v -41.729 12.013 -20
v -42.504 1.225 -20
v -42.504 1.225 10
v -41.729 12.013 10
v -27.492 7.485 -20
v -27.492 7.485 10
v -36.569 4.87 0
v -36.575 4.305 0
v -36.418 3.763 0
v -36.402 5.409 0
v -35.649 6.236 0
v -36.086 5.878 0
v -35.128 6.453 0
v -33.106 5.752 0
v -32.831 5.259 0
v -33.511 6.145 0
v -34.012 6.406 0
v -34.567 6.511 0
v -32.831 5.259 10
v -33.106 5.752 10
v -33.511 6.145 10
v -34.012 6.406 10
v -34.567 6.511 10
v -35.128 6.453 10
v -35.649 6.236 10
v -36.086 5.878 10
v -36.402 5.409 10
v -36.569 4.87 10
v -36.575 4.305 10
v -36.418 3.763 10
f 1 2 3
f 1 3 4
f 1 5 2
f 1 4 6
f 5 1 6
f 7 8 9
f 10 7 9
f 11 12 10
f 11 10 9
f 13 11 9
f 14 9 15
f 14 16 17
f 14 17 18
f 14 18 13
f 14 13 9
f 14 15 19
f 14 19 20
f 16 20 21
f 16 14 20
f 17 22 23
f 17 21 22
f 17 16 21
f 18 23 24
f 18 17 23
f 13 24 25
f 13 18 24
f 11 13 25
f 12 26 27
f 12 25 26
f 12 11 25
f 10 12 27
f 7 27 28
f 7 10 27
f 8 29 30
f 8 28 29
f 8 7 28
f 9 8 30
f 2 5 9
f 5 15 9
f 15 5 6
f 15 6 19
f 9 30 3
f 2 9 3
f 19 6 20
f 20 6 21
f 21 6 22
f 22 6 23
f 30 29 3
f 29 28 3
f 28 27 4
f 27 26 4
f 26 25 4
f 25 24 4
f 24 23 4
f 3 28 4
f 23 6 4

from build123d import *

# Parameters (mm, degrees)
CIRCLE_R              = 1.944096
EXTRUDE010_DEPTH      = 100
EXTRUDE008_DEPTH      = 10
EXTRUDE008_DEPTH_BACK = 20


with BuildPart() as extrude010:
    # Circle → Extrude010 (new body)
    with BuildSketch(Plane(origin=(-34.648671, 4.568851, 0), x_dir=(1, 0, 0), z_dir=(0, 0, 1))):
        Circle(CIRCLE_R)
    extrude(amount=EXTRUDE010_DEPTH)


with BuildPart() as cut:
    # Wire002 → Extrude008 (new body, two sides)
    with BuildSketch(Plane(origin=(-41.728547, 12.01263, 0), x_dir=(1, 0, 0), z_dir=(0, 0, 1))) as extrude008_sk:
        Polygon((0, 0), (14.236612, -4.528044), (-0.775791, -10.787191), align=None)
    extrude(amount=EXTRUDE008_DEPTH)
    extrude(extrude008_sk.sketch, amount=-EXTRUDE008_DEPTH_BACK)

    # Cut: cut Extrude010
    add(extrude010.part, mode=Mode.SUBTRACT)


solid = cut.part
